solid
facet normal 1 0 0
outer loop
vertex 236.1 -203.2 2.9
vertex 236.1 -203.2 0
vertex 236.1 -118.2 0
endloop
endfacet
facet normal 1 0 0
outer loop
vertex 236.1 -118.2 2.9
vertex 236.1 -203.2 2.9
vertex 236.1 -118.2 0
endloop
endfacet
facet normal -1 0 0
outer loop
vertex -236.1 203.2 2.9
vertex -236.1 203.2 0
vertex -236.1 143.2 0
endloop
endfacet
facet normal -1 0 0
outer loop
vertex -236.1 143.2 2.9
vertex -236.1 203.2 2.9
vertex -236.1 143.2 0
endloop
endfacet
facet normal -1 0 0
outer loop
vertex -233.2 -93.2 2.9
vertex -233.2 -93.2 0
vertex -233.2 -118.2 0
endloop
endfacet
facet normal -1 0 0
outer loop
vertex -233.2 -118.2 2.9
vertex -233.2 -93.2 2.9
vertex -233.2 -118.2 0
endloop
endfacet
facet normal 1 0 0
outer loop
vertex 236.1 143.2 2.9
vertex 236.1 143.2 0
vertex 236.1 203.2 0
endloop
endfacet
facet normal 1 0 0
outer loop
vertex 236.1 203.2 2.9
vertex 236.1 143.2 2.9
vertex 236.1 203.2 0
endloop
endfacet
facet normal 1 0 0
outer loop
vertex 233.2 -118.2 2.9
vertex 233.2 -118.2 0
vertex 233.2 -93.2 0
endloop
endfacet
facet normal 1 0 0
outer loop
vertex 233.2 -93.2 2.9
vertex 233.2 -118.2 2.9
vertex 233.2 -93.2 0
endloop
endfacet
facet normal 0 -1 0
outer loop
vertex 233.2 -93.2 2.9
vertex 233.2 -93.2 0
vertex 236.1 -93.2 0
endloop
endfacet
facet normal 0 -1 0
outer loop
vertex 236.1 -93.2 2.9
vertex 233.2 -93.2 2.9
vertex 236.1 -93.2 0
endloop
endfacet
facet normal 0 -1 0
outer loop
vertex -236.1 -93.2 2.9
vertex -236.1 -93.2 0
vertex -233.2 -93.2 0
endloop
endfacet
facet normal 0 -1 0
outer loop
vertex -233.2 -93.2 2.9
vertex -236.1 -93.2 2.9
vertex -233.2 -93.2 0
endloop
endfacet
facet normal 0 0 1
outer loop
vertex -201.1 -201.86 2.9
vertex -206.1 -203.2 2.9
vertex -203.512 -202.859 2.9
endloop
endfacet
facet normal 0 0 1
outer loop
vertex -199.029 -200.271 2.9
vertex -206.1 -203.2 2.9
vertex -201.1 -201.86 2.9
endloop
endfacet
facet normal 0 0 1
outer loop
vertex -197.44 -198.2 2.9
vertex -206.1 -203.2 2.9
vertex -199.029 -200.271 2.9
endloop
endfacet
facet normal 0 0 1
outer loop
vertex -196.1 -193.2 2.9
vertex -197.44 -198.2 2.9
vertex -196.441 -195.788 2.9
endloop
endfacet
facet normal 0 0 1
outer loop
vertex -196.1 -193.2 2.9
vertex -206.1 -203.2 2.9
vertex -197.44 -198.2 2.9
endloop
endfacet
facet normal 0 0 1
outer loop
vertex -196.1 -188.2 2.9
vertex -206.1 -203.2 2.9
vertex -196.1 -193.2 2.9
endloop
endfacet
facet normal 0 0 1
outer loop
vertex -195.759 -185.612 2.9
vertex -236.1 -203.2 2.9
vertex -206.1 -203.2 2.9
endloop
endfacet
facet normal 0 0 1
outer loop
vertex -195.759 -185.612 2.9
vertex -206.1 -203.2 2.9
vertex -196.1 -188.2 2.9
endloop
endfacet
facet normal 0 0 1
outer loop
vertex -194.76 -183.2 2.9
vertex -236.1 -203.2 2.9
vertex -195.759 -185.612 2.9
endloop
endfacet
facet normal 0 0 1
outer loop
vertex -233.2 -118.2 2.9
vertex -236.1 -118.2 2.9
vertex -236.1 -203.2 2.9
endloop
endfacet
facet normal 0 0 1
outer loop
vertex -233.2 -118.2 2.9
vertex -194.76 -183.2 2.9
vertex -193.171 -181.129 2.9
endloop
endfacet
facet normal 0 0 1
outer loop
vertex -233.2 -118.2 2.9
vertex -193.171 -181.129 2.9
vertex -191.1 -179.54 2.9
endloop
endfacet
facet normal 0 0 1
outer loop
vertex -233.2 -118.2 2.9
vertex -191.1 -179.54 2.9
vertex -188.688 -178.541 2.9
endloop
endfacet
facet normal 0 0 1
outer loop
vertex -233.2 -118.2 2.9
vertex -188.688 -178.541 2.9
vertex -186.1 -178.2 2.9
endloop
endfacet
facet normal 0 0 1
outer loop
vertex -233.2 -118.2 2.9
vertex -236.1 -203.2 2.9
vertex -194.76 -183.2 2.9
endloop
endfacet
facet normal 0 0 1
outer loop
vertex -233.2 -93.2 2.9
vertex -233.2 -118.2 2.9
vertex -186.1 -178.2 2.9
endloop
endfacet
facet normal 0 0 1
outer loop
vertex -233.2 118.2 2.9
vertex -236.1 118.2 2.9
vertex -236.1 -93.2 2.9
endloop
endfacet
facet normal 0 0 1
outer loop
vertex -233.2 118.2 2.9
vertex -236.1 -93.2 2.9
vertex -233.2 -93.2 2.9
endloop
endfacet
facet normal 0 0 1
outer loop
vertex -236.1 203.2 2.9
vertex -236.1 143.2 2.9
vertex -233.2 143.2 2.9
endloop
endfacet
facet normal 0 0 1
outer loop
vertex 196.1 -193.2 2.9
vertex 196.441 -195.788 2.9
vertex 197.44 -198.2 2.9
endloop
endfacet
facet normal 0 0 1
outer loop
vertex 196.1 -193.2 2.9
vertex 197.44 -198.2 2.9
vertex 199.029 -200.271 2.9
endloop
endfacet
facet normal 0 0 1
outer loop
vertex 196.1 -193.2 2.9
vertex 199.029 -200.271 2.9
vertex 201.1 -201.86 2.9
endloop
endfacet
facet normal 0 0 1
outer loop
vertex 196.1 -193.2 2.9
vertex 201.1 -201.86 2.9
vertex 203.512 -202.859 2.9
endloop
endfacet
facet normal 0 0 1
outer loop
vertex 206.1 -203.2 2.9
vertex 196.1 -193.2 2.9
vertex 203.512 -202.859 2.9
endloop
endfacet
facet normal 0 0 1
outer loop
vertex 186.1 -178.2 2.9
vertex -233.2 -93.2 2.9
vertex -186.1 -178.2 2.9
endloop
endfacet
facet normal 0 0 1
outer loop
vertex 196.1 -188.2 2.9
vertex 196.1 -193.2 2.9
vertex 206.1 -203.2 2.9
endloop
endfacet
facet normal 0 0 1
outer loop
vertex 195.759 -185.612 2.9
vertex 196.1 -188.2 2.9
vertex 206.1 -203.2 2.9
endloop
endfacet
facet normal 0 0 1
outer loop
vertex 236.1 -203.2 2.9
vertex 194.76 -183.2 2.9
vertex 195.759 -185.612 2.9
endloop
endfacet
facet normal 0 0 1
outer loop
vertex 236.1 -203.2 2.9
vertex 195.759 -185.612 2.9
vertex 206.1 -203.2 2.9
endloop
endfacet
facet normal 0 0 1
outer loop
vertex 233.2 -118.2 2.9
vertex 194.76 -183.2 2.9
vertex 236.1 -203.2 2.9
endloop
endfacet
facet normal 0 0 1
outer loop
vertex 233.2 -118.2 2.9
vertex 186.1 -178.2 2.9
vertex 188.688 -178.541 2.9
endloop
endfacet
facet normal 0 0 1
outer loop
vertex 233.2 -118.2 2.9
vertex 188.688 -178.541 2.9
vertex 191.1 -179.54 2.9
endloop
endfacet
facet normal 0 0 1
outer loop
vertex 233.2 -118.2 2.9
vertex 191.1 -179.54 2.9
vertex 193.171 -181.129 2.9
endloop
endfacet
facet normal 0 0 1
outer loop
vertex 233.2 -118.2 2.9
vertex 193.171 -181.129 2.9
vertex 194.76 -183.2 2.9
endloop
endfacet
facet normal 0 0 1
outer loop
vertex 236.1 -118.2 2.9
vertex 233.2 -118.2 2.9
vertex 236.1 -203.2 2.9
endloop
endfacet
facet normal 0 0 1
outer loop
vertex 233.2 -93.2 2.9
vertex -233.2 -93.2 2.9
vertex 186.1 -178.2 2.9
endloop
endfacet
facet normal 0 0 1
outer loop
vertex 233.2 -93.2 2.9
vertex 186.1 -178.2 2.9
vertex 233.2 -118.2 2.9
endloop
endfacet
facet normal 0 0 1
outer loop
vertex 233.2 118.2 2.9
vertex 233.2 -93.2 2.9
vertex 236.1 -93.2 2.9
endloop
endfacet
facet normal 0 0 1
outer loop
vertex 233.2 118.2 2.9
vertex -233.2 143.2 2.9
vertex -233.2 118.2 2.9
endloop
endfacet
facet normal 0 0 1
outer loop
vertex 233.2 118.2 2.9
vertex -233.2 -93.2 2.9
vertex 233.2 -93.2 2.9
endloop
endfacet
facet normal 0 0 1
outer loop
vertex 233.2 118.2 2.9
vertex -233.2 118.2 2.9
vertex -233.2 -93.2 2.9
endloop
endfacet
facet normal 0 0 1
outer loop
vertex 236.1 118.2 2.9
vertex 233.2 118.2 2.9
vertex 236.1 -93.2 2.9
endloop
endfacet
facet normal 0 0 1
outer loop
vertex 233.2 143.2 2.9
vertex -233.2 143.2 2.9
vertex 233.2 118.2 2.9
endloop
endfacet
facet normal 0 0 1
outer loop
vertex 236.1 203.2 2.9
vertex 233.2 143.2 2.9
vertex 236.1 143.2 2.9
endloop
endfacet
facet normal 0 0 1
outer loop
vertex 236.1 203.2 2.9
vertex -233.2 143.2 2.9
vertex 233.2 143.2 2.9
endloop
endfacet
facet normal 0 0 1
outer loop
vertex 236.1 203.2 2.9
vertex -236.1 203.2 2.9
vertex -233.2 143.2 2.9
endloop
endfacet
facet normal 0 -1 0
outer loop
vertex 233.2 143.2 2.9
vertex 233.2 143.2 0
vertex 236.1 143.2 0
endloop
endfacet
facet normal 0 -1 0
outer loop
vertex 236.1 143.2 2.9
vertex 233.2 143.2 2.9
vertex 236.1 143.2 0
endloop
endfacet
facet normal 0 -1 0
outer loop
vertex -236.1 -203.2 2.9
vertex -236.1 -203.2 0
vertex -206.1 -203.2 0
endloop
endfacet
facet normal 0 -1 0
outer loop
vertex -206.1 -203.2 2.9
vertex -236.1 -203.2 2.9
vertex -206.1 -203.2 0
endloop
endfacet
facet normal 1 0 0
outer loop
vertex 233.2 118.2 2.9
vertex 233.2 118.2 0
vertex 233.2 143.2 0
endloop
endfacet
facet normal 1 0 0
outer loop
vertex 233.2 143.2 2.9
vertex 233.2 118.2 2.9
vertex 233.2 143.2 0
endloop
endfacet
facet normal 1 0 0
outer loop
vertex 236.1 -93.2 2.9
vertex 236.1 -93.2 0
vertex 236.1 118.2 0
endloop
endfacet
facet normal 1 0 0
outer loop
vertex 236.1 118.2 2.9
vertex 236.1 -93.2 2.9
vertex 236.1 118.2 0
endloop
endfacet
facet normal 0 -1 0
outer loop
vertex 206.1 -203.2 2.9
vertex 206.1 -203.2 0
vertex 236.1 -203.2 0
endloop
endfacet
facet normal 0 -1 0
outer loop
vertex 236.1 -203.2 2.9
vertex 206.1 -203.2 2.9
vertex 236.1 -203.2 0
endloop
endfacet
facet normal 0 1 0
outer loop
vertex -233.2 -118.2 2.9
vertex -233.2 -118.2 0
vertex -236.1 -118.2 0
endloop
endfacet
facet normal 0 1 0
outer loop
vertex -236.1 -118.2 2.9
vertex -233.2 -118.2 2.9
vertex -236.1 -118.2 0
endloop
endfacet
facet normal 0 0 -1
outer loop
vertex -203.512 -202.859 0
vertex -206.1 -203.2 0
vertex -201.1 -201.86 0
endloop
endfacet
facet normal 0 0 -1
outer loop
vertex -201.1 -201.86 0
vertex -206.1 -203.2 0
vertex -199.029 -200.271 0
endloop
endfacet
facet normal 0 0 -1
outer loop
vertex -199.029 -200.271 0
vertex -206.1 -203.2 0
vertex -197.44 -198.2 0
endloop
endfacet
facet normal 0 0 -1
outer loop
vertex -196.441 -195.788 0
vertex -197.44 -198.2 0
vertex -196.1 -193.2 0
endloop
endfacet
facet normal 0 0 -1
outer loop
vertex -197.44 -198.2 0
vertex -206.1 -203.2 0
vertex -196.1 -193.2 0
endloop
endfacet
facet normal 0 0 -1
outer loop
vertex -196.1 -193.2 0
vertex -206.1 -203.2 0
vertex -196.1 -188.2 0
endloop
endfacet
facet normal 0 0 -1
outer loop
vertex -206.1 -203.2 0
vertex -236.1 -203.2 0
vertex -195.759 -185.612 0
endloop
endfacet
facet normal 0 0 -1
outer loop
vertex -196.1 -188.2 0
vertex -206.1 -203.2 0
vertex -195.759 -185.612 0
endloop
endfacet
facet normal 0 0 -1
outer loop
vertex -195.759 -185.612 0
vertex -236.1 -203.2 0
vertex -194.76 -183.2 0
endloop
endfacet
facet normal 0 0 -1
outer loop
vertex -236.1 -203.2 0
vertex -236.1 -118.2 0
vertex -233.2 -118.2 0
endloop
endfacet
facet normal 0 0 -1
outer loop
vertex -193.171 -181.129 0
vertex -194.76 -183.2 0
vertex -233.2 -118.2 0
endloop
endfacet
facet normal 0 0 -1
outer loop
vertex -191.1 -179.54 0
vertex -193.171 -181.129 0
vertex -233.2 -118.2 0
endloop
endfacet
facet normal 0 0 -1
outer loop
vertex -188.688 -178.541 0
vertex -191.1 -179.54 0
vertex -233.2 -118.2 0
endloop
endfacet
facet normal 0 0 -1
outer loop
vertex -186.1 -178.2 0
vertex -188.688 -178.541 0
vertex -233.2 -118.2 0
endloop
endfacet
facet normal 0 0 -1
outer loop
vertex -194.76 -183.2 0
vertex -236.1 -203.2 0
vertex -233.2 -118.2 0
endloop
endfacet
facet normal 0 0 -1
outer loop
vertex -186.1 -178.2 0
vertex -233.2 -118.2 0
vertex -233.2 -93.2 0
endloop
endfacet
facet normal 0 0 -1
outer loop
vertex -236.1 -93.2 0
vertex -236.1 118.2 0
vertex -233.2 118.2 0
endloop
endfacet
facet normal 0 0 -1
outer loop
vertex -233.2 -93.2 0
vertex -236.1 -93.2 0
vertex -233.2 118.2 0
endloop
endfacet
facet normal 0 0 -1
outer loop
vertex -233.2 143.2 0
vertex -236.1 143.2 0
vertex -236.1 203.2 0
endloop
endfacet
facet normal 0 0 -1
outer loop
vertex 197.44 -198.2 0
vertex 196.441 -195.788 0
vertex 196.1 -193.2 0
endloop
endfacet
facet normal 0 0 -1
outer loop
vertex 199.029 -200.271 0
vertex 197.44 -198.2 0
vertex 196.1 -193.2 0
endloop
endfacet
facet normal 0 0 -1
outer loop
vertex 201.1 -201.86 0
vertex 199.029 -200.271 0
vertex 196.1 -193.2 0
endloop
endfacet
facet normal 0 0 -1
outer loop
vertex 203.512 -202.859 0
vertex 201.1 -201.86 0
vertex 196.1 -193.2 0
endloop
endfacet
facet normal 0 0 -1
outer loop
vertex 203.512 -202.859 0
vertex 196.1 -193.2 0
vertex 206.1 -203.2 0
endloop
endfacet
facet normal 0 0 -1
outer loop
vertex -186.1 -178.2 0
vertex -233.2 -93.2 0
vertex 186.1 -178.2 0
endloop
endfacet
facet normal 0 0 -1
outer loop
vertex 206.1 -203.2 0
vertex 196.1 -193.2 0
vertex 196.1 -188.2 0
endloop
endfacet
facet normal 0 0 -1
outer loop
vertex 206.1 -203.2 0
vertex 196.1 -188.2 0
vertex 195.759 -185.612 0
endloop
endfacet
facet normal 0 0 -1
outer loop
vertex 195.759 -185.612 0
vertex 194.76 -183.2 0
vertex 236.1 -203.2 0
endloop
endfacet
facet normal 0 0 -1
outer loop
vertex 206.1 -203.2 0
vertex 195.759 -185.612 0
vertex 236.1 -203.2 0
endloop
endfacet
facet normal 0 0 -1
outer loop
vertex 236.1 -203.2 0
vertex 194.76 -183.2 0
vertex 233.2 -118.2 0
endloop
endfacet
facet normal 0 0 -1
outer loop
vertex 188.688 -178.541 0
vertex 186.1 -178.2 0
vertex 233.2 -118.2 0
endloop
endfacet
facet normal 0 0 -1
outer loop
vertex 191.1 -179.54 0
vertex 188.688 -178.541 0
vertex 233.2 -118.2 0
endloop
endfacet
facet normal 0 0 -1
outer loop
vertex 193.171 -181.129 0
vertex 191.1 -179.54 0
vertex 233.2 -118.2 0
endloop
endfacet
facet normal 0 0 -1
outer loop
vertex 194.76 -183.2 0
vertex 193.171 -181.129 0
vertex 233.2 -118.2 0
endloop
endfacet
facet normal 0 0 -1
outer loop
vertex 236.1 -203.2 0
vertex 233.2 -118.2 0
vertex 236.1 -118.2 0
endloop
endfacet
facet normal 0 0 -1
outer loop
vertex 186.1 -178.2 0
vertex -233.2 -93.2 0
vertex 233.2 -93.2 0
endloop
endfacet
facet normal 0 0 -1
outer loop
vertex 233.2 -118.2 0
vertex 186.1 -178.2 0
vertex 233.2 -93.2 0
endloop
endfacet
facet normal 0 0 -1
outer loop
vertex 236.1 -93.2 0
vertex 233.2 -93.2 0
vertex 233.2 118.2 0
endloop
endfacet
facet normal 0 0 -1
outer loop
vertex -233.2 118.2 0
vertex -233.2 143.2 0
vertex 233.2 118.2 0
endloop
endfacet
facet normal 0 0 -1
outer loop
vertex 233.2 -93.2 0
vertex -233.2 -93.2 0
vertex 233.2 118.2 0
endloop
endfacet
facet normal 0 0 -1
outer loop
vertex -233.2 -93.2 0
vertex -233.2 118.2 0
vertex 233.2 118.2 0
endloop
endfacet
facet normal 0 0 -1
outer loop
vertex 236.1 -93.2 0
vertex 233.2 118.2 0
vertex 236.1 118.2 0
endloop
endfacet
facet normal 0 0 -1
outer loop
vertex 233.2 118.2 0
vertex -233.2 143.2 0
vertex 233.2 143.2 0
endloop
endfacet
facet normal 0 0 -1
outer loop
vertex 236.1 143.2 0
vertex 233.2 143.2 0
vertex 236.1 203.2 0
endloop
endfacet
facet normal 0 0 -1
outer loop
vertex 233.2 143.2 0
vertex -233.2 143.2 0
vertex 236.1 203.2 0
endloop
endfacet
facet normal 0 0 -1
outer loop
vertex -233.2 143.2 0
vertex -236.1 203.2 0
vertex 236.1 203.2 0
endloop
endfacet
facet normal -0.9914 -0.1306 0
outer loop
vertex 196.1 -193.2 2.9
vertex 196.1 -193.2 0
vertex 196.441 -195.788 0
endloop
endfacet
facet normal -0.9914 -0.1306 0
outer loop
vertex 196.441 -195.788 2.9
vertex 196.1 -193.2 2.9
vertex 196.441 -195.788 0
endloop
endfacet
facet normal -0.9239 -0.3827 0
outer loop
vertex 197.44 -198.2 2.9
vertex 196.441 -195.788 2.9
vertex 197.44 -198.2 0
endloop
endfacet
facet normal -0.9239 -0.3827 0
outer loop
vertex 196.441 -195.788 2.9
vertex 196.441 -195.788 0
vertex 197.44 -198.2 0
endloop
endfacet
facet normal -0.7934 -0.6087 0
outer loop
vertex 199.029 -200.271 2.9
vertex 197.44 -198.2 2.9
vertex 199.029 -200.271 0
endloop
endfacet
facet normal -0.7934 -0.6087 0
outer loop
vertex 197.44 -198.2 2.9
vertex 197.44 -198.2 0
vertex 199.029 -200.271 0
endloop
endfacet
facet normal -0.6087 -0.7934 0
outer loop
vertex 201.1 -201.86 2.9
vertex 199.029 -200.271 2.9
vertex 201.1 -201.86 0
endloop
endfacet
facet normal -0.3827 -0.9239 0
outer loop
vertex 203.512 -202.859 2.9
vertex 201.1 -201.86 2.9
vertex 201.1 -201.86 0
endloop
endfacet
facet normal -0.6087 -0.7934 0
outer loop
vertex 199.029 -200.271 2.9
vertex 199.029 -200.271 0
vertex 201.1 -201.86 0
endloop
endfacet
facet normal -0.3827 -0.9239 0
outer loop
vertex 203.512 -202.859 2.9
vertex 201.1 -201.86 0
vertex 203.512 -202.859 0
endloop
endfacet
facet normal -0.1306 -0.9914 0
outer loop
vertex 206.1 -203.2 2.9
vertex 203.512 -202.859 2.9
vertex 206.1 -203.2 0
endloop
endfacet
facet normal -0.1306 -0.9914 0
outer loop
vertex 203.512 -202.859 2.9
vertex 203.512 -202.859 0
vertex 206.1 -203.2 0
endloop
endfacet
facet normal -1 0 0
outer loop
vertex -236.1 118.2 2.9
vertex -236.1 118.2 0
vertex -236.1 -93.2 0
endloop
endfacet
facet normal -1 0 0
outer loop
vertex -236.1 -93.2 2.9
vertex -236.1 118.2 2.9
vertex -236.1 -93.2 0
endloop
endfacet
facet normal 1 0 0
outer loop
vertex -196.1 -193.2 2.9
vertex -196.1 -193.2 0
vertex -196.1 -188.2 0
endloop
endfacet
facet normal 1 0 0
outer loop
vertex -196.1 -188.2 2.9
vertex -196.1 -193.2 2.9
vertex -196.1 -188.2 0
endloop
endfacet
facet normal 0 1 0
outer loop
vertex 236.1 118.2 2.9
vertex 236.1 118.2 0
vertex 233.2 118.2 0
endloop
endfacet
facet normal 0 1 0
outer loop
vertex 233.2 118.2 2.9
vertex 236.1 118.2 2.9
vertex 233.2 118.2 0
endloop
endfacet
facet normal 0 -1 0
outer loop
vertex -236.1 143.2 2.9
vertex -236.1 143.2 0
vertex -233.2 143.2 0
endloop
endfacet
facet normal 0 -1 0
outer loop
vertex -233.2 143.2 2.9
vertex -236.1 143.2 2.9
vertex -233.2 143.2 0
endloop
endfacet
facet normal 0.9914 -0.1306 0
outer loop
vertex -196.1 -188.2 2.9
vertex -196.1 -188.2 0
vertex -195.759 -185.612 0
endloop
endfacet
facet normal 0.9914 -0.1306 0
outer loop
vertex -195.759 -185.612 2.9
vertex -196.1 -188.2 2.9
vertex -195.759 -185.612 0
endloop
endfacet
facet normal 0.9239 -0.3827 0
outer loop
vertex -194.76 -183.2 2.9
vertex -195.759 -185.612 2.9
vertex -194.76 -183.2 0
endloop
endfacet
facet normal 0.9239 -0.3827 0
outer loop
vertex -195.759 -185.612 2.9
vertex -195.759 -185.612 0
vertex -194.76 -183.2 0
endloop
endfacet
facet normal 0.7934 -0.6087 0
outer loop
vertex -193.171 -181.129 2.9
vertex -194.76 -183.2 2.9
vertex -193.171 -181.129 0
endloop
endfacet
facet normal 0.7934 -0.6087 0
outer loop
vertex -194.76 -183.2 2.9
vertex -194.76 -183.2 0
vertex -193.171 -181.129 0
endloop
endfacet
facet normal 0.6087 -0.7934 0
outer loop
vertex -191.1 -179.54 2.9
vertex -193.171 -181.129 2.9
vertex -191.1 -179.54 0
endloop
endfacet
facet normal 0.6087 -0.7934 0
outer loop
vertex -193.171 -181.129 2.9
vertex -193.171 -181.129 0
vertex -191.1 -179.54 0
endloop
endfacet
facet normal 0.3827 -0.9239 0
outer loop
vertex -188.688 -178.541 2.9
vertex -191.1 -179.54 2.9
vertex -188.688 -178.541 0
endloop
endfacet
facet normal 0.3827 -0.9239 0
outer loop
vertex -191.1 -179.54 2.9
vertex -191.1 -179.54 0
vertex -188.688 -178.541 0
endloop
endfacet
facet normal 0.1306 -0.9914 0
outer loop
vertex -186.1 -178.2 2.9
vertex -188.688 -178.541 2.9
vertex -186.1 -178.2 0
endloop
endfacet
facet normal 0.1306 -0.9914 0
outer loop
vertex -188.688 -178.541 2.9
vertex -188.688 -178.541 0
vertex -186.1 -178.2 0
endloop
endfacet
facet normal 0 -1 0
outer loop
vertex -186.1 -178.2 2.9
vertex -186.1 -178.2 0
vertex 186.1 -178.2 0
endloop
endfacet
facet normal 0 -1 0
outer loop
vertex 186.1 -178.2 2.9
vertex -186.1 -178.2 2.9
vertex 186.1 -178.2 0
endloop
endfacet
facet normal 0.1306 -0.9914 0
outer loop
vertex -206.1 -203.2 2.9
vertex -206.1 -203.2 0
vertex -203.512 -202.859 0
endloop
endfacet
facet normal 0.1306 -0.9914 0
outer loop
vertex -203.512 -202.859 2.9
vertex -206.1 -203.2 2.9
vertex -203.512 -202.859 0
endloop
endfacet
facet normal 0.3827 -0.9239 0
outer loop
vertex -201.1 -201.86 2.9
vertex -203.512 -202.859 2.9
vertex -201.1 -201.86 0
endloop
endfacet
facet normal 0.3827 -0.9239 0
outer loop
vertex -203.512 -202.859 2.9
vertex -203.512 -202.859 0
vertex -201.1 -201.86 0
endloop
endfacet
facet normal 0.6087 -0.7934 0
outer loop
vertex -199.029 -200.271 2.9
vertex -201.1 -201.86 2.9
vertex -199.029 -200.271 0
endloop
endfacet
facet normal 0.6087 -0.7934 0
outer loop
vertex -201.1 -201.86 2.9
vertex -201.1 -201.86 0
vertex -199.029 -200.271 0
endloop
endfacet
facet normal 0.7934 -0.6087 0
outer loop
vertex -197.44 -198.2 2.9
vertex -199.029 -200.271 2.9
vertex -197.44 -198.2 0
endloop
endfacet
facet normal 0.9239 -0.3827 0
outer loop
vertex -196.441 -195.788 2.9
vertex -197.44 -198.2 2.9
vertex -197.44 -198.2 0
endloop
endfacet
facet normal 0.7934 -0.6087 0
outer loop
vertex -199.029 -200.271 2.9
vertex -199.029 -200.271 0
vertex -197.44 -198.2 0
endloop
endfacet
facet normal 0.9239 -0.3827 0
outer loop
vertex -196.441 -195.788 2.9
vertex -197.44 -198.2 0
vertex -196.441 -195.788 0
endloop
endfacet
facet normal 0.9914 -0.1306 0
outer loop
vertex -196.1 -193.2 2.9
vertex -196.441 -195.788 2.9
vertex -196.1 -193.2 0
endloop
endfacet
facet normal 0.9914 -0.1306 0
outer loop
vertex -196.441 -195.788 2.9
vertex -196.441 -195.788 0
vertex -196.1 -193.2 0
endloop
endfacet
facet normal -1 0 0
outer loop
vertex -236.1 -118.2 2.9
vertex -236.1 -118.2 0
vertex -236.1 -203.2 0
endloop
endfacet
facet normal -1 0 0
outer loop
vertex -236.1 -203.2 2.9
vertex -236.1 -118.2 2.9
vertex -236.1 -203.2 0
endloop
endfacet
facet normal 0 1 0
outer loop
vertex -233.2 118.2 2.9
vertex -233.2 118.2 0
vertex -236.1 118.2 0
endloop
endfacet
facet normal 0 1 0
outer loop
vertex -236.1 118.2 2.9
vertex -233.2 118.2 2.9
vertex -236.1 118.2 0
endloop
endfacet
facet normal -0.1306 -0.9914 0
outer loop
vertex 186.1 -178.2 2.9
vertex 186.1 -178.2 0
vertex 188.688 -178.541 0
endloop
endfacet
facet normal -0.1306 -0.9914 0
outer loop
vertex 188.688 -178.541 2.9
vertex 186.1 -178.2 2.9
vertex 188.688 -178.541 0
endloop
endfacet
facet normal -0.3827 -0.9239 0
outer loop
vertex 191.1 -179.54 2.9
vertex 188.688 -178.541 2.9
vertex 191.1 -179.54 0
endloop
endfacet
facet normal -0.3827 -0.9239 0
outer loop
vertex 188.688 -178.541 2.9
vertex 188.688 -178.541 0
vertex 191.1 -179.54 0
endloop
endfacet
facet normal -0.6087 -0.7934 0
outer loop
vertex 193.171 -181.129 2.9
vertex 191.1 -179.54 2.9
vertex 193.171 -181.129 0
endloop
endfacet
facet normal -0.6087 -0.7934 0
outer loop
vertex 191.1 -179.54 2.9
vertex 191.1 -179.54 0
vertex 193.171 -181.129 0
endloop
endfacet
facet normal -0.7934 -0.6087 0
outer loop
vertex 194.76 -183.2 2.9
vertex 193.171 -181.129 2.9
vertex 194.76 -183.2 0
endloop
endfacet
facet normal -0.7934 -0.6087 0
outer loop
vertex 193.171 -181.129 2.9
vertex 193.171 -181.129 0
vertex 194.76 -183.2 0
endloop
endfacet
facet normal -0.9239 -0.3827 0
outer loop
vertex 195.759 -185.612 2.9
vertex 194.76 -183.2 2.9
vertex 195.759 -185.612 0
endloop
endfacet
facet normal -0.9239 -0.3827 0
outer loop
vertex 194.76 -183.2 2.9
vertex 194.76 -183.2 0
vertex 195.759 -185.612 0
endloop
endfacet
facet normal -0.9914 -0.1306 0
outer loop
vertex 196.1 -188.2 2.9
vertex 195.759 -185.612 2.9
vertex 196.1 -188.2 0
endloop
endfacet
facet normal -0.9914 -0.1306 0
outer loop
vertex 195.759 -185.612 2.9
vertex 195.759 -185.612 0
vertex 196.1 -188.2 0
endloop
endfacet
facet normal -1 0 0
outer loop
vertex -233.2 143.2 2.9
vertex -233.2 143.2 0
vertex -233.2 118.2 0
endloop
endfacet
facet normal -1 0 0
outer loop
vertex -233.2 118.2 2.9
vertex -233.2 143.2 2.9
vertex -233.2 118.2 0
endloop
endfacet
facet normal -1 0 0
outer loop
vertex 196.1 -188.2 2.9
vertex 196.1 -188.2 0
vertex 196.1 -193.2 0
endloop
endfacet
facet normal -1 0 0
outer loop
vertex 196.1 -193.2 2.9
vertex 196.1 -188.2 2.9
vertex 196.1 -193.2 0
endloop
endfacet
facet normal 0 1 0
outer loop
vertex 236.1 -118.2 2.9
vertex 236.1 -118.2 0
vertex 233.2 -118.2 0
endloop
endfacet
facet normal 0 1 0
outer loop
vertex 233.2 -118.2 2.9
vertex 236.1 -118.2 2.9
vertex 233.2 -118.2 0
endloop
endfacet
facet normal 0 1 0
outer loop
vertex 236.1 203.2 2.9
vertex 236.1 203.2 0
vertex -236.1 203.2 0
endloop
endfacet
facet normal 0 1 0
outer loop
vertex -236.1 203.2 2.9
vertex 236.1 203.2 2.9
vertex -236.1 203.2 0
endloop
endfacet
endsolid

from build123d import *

# Parameters (mm, degrees)
BOSS_EXTRUDE1_DEPTH = 2.9


with BuildPart() as part:
    # Sketch1 → Boss-Extrude1 (new body)
    with BuildSketch(Plane.XY):
        with BuildLine():
            Line((206.1, -203.2), (236.1, -203.2))
            Line((236.1, -203.2), (236.1, -118.2))
            Line((236.1, -118.2), (233.2, -118.2))
            Line((233.2, -118.2), (233.2, -93.2))
            Line((233.2, -93.2), (236.1, -93.2))
            Line((236.1, -93.2), (236.1, 118.2))
            Line((236.1, 118.2), (233.2, 118.2))
            Line((233.2, 118.2), (233.2, 143.2))
            Line((233.2, 143.2), (236.1, 143.2))
            Line((236.1, 143.2), (236.1, 203.2))
            Line((236.1, 203.2), (-236.1, 203.2))
            Line((-236.1, 203.2), (-236.1, 143.2))
            Line((-236.1, 143.2), (-233.2, 143.2))
            Line((-233.2, 143.2), (-233.2, 118.2))
            Line((-233.2, 118.2), (-236.1, 118.2))
            Line((-236.1, 118.2), (-236.1, -93.2))
            Line((-236.1, -93.2), (-233.2, -93.2))
            Line((-233.2, -93.2), (-233.2, -118.2))
            Line((-233.2, -118.2), (-236.1, -118.2))
            Line((-236.1, -118.2), (-236.1, -203.2))
            Line((-236.1, -203.2), (-206.1, -203.2))
            ThreePointArc((-206.1, -203.2), (-199.028932188, -200.271067812), (-196.1, -193.2))
            Line((-196.1, -193.2), (-196.1, -188.2))
            ThreePointArc((-196.1, -188.2), (-193.171067812, -181.128932188), (-186.1, -178.2))
            Line((-186.1, -178.2), (186.1, -178.2))
            ThreePointArc((186.1, -178.2), (193.171067812, -181.128932188), (196.1, -188.2))
            Line((196.1, -188.2), (196.1, -193.2))
            ThreePointArc((196.1, -193.2), (199.028932188, -200.271067812), (206.1, -203.2))
        make_face()
    extrude(amount=BOSS_EXTRUDE1_DEPTH)


solid = part.part
